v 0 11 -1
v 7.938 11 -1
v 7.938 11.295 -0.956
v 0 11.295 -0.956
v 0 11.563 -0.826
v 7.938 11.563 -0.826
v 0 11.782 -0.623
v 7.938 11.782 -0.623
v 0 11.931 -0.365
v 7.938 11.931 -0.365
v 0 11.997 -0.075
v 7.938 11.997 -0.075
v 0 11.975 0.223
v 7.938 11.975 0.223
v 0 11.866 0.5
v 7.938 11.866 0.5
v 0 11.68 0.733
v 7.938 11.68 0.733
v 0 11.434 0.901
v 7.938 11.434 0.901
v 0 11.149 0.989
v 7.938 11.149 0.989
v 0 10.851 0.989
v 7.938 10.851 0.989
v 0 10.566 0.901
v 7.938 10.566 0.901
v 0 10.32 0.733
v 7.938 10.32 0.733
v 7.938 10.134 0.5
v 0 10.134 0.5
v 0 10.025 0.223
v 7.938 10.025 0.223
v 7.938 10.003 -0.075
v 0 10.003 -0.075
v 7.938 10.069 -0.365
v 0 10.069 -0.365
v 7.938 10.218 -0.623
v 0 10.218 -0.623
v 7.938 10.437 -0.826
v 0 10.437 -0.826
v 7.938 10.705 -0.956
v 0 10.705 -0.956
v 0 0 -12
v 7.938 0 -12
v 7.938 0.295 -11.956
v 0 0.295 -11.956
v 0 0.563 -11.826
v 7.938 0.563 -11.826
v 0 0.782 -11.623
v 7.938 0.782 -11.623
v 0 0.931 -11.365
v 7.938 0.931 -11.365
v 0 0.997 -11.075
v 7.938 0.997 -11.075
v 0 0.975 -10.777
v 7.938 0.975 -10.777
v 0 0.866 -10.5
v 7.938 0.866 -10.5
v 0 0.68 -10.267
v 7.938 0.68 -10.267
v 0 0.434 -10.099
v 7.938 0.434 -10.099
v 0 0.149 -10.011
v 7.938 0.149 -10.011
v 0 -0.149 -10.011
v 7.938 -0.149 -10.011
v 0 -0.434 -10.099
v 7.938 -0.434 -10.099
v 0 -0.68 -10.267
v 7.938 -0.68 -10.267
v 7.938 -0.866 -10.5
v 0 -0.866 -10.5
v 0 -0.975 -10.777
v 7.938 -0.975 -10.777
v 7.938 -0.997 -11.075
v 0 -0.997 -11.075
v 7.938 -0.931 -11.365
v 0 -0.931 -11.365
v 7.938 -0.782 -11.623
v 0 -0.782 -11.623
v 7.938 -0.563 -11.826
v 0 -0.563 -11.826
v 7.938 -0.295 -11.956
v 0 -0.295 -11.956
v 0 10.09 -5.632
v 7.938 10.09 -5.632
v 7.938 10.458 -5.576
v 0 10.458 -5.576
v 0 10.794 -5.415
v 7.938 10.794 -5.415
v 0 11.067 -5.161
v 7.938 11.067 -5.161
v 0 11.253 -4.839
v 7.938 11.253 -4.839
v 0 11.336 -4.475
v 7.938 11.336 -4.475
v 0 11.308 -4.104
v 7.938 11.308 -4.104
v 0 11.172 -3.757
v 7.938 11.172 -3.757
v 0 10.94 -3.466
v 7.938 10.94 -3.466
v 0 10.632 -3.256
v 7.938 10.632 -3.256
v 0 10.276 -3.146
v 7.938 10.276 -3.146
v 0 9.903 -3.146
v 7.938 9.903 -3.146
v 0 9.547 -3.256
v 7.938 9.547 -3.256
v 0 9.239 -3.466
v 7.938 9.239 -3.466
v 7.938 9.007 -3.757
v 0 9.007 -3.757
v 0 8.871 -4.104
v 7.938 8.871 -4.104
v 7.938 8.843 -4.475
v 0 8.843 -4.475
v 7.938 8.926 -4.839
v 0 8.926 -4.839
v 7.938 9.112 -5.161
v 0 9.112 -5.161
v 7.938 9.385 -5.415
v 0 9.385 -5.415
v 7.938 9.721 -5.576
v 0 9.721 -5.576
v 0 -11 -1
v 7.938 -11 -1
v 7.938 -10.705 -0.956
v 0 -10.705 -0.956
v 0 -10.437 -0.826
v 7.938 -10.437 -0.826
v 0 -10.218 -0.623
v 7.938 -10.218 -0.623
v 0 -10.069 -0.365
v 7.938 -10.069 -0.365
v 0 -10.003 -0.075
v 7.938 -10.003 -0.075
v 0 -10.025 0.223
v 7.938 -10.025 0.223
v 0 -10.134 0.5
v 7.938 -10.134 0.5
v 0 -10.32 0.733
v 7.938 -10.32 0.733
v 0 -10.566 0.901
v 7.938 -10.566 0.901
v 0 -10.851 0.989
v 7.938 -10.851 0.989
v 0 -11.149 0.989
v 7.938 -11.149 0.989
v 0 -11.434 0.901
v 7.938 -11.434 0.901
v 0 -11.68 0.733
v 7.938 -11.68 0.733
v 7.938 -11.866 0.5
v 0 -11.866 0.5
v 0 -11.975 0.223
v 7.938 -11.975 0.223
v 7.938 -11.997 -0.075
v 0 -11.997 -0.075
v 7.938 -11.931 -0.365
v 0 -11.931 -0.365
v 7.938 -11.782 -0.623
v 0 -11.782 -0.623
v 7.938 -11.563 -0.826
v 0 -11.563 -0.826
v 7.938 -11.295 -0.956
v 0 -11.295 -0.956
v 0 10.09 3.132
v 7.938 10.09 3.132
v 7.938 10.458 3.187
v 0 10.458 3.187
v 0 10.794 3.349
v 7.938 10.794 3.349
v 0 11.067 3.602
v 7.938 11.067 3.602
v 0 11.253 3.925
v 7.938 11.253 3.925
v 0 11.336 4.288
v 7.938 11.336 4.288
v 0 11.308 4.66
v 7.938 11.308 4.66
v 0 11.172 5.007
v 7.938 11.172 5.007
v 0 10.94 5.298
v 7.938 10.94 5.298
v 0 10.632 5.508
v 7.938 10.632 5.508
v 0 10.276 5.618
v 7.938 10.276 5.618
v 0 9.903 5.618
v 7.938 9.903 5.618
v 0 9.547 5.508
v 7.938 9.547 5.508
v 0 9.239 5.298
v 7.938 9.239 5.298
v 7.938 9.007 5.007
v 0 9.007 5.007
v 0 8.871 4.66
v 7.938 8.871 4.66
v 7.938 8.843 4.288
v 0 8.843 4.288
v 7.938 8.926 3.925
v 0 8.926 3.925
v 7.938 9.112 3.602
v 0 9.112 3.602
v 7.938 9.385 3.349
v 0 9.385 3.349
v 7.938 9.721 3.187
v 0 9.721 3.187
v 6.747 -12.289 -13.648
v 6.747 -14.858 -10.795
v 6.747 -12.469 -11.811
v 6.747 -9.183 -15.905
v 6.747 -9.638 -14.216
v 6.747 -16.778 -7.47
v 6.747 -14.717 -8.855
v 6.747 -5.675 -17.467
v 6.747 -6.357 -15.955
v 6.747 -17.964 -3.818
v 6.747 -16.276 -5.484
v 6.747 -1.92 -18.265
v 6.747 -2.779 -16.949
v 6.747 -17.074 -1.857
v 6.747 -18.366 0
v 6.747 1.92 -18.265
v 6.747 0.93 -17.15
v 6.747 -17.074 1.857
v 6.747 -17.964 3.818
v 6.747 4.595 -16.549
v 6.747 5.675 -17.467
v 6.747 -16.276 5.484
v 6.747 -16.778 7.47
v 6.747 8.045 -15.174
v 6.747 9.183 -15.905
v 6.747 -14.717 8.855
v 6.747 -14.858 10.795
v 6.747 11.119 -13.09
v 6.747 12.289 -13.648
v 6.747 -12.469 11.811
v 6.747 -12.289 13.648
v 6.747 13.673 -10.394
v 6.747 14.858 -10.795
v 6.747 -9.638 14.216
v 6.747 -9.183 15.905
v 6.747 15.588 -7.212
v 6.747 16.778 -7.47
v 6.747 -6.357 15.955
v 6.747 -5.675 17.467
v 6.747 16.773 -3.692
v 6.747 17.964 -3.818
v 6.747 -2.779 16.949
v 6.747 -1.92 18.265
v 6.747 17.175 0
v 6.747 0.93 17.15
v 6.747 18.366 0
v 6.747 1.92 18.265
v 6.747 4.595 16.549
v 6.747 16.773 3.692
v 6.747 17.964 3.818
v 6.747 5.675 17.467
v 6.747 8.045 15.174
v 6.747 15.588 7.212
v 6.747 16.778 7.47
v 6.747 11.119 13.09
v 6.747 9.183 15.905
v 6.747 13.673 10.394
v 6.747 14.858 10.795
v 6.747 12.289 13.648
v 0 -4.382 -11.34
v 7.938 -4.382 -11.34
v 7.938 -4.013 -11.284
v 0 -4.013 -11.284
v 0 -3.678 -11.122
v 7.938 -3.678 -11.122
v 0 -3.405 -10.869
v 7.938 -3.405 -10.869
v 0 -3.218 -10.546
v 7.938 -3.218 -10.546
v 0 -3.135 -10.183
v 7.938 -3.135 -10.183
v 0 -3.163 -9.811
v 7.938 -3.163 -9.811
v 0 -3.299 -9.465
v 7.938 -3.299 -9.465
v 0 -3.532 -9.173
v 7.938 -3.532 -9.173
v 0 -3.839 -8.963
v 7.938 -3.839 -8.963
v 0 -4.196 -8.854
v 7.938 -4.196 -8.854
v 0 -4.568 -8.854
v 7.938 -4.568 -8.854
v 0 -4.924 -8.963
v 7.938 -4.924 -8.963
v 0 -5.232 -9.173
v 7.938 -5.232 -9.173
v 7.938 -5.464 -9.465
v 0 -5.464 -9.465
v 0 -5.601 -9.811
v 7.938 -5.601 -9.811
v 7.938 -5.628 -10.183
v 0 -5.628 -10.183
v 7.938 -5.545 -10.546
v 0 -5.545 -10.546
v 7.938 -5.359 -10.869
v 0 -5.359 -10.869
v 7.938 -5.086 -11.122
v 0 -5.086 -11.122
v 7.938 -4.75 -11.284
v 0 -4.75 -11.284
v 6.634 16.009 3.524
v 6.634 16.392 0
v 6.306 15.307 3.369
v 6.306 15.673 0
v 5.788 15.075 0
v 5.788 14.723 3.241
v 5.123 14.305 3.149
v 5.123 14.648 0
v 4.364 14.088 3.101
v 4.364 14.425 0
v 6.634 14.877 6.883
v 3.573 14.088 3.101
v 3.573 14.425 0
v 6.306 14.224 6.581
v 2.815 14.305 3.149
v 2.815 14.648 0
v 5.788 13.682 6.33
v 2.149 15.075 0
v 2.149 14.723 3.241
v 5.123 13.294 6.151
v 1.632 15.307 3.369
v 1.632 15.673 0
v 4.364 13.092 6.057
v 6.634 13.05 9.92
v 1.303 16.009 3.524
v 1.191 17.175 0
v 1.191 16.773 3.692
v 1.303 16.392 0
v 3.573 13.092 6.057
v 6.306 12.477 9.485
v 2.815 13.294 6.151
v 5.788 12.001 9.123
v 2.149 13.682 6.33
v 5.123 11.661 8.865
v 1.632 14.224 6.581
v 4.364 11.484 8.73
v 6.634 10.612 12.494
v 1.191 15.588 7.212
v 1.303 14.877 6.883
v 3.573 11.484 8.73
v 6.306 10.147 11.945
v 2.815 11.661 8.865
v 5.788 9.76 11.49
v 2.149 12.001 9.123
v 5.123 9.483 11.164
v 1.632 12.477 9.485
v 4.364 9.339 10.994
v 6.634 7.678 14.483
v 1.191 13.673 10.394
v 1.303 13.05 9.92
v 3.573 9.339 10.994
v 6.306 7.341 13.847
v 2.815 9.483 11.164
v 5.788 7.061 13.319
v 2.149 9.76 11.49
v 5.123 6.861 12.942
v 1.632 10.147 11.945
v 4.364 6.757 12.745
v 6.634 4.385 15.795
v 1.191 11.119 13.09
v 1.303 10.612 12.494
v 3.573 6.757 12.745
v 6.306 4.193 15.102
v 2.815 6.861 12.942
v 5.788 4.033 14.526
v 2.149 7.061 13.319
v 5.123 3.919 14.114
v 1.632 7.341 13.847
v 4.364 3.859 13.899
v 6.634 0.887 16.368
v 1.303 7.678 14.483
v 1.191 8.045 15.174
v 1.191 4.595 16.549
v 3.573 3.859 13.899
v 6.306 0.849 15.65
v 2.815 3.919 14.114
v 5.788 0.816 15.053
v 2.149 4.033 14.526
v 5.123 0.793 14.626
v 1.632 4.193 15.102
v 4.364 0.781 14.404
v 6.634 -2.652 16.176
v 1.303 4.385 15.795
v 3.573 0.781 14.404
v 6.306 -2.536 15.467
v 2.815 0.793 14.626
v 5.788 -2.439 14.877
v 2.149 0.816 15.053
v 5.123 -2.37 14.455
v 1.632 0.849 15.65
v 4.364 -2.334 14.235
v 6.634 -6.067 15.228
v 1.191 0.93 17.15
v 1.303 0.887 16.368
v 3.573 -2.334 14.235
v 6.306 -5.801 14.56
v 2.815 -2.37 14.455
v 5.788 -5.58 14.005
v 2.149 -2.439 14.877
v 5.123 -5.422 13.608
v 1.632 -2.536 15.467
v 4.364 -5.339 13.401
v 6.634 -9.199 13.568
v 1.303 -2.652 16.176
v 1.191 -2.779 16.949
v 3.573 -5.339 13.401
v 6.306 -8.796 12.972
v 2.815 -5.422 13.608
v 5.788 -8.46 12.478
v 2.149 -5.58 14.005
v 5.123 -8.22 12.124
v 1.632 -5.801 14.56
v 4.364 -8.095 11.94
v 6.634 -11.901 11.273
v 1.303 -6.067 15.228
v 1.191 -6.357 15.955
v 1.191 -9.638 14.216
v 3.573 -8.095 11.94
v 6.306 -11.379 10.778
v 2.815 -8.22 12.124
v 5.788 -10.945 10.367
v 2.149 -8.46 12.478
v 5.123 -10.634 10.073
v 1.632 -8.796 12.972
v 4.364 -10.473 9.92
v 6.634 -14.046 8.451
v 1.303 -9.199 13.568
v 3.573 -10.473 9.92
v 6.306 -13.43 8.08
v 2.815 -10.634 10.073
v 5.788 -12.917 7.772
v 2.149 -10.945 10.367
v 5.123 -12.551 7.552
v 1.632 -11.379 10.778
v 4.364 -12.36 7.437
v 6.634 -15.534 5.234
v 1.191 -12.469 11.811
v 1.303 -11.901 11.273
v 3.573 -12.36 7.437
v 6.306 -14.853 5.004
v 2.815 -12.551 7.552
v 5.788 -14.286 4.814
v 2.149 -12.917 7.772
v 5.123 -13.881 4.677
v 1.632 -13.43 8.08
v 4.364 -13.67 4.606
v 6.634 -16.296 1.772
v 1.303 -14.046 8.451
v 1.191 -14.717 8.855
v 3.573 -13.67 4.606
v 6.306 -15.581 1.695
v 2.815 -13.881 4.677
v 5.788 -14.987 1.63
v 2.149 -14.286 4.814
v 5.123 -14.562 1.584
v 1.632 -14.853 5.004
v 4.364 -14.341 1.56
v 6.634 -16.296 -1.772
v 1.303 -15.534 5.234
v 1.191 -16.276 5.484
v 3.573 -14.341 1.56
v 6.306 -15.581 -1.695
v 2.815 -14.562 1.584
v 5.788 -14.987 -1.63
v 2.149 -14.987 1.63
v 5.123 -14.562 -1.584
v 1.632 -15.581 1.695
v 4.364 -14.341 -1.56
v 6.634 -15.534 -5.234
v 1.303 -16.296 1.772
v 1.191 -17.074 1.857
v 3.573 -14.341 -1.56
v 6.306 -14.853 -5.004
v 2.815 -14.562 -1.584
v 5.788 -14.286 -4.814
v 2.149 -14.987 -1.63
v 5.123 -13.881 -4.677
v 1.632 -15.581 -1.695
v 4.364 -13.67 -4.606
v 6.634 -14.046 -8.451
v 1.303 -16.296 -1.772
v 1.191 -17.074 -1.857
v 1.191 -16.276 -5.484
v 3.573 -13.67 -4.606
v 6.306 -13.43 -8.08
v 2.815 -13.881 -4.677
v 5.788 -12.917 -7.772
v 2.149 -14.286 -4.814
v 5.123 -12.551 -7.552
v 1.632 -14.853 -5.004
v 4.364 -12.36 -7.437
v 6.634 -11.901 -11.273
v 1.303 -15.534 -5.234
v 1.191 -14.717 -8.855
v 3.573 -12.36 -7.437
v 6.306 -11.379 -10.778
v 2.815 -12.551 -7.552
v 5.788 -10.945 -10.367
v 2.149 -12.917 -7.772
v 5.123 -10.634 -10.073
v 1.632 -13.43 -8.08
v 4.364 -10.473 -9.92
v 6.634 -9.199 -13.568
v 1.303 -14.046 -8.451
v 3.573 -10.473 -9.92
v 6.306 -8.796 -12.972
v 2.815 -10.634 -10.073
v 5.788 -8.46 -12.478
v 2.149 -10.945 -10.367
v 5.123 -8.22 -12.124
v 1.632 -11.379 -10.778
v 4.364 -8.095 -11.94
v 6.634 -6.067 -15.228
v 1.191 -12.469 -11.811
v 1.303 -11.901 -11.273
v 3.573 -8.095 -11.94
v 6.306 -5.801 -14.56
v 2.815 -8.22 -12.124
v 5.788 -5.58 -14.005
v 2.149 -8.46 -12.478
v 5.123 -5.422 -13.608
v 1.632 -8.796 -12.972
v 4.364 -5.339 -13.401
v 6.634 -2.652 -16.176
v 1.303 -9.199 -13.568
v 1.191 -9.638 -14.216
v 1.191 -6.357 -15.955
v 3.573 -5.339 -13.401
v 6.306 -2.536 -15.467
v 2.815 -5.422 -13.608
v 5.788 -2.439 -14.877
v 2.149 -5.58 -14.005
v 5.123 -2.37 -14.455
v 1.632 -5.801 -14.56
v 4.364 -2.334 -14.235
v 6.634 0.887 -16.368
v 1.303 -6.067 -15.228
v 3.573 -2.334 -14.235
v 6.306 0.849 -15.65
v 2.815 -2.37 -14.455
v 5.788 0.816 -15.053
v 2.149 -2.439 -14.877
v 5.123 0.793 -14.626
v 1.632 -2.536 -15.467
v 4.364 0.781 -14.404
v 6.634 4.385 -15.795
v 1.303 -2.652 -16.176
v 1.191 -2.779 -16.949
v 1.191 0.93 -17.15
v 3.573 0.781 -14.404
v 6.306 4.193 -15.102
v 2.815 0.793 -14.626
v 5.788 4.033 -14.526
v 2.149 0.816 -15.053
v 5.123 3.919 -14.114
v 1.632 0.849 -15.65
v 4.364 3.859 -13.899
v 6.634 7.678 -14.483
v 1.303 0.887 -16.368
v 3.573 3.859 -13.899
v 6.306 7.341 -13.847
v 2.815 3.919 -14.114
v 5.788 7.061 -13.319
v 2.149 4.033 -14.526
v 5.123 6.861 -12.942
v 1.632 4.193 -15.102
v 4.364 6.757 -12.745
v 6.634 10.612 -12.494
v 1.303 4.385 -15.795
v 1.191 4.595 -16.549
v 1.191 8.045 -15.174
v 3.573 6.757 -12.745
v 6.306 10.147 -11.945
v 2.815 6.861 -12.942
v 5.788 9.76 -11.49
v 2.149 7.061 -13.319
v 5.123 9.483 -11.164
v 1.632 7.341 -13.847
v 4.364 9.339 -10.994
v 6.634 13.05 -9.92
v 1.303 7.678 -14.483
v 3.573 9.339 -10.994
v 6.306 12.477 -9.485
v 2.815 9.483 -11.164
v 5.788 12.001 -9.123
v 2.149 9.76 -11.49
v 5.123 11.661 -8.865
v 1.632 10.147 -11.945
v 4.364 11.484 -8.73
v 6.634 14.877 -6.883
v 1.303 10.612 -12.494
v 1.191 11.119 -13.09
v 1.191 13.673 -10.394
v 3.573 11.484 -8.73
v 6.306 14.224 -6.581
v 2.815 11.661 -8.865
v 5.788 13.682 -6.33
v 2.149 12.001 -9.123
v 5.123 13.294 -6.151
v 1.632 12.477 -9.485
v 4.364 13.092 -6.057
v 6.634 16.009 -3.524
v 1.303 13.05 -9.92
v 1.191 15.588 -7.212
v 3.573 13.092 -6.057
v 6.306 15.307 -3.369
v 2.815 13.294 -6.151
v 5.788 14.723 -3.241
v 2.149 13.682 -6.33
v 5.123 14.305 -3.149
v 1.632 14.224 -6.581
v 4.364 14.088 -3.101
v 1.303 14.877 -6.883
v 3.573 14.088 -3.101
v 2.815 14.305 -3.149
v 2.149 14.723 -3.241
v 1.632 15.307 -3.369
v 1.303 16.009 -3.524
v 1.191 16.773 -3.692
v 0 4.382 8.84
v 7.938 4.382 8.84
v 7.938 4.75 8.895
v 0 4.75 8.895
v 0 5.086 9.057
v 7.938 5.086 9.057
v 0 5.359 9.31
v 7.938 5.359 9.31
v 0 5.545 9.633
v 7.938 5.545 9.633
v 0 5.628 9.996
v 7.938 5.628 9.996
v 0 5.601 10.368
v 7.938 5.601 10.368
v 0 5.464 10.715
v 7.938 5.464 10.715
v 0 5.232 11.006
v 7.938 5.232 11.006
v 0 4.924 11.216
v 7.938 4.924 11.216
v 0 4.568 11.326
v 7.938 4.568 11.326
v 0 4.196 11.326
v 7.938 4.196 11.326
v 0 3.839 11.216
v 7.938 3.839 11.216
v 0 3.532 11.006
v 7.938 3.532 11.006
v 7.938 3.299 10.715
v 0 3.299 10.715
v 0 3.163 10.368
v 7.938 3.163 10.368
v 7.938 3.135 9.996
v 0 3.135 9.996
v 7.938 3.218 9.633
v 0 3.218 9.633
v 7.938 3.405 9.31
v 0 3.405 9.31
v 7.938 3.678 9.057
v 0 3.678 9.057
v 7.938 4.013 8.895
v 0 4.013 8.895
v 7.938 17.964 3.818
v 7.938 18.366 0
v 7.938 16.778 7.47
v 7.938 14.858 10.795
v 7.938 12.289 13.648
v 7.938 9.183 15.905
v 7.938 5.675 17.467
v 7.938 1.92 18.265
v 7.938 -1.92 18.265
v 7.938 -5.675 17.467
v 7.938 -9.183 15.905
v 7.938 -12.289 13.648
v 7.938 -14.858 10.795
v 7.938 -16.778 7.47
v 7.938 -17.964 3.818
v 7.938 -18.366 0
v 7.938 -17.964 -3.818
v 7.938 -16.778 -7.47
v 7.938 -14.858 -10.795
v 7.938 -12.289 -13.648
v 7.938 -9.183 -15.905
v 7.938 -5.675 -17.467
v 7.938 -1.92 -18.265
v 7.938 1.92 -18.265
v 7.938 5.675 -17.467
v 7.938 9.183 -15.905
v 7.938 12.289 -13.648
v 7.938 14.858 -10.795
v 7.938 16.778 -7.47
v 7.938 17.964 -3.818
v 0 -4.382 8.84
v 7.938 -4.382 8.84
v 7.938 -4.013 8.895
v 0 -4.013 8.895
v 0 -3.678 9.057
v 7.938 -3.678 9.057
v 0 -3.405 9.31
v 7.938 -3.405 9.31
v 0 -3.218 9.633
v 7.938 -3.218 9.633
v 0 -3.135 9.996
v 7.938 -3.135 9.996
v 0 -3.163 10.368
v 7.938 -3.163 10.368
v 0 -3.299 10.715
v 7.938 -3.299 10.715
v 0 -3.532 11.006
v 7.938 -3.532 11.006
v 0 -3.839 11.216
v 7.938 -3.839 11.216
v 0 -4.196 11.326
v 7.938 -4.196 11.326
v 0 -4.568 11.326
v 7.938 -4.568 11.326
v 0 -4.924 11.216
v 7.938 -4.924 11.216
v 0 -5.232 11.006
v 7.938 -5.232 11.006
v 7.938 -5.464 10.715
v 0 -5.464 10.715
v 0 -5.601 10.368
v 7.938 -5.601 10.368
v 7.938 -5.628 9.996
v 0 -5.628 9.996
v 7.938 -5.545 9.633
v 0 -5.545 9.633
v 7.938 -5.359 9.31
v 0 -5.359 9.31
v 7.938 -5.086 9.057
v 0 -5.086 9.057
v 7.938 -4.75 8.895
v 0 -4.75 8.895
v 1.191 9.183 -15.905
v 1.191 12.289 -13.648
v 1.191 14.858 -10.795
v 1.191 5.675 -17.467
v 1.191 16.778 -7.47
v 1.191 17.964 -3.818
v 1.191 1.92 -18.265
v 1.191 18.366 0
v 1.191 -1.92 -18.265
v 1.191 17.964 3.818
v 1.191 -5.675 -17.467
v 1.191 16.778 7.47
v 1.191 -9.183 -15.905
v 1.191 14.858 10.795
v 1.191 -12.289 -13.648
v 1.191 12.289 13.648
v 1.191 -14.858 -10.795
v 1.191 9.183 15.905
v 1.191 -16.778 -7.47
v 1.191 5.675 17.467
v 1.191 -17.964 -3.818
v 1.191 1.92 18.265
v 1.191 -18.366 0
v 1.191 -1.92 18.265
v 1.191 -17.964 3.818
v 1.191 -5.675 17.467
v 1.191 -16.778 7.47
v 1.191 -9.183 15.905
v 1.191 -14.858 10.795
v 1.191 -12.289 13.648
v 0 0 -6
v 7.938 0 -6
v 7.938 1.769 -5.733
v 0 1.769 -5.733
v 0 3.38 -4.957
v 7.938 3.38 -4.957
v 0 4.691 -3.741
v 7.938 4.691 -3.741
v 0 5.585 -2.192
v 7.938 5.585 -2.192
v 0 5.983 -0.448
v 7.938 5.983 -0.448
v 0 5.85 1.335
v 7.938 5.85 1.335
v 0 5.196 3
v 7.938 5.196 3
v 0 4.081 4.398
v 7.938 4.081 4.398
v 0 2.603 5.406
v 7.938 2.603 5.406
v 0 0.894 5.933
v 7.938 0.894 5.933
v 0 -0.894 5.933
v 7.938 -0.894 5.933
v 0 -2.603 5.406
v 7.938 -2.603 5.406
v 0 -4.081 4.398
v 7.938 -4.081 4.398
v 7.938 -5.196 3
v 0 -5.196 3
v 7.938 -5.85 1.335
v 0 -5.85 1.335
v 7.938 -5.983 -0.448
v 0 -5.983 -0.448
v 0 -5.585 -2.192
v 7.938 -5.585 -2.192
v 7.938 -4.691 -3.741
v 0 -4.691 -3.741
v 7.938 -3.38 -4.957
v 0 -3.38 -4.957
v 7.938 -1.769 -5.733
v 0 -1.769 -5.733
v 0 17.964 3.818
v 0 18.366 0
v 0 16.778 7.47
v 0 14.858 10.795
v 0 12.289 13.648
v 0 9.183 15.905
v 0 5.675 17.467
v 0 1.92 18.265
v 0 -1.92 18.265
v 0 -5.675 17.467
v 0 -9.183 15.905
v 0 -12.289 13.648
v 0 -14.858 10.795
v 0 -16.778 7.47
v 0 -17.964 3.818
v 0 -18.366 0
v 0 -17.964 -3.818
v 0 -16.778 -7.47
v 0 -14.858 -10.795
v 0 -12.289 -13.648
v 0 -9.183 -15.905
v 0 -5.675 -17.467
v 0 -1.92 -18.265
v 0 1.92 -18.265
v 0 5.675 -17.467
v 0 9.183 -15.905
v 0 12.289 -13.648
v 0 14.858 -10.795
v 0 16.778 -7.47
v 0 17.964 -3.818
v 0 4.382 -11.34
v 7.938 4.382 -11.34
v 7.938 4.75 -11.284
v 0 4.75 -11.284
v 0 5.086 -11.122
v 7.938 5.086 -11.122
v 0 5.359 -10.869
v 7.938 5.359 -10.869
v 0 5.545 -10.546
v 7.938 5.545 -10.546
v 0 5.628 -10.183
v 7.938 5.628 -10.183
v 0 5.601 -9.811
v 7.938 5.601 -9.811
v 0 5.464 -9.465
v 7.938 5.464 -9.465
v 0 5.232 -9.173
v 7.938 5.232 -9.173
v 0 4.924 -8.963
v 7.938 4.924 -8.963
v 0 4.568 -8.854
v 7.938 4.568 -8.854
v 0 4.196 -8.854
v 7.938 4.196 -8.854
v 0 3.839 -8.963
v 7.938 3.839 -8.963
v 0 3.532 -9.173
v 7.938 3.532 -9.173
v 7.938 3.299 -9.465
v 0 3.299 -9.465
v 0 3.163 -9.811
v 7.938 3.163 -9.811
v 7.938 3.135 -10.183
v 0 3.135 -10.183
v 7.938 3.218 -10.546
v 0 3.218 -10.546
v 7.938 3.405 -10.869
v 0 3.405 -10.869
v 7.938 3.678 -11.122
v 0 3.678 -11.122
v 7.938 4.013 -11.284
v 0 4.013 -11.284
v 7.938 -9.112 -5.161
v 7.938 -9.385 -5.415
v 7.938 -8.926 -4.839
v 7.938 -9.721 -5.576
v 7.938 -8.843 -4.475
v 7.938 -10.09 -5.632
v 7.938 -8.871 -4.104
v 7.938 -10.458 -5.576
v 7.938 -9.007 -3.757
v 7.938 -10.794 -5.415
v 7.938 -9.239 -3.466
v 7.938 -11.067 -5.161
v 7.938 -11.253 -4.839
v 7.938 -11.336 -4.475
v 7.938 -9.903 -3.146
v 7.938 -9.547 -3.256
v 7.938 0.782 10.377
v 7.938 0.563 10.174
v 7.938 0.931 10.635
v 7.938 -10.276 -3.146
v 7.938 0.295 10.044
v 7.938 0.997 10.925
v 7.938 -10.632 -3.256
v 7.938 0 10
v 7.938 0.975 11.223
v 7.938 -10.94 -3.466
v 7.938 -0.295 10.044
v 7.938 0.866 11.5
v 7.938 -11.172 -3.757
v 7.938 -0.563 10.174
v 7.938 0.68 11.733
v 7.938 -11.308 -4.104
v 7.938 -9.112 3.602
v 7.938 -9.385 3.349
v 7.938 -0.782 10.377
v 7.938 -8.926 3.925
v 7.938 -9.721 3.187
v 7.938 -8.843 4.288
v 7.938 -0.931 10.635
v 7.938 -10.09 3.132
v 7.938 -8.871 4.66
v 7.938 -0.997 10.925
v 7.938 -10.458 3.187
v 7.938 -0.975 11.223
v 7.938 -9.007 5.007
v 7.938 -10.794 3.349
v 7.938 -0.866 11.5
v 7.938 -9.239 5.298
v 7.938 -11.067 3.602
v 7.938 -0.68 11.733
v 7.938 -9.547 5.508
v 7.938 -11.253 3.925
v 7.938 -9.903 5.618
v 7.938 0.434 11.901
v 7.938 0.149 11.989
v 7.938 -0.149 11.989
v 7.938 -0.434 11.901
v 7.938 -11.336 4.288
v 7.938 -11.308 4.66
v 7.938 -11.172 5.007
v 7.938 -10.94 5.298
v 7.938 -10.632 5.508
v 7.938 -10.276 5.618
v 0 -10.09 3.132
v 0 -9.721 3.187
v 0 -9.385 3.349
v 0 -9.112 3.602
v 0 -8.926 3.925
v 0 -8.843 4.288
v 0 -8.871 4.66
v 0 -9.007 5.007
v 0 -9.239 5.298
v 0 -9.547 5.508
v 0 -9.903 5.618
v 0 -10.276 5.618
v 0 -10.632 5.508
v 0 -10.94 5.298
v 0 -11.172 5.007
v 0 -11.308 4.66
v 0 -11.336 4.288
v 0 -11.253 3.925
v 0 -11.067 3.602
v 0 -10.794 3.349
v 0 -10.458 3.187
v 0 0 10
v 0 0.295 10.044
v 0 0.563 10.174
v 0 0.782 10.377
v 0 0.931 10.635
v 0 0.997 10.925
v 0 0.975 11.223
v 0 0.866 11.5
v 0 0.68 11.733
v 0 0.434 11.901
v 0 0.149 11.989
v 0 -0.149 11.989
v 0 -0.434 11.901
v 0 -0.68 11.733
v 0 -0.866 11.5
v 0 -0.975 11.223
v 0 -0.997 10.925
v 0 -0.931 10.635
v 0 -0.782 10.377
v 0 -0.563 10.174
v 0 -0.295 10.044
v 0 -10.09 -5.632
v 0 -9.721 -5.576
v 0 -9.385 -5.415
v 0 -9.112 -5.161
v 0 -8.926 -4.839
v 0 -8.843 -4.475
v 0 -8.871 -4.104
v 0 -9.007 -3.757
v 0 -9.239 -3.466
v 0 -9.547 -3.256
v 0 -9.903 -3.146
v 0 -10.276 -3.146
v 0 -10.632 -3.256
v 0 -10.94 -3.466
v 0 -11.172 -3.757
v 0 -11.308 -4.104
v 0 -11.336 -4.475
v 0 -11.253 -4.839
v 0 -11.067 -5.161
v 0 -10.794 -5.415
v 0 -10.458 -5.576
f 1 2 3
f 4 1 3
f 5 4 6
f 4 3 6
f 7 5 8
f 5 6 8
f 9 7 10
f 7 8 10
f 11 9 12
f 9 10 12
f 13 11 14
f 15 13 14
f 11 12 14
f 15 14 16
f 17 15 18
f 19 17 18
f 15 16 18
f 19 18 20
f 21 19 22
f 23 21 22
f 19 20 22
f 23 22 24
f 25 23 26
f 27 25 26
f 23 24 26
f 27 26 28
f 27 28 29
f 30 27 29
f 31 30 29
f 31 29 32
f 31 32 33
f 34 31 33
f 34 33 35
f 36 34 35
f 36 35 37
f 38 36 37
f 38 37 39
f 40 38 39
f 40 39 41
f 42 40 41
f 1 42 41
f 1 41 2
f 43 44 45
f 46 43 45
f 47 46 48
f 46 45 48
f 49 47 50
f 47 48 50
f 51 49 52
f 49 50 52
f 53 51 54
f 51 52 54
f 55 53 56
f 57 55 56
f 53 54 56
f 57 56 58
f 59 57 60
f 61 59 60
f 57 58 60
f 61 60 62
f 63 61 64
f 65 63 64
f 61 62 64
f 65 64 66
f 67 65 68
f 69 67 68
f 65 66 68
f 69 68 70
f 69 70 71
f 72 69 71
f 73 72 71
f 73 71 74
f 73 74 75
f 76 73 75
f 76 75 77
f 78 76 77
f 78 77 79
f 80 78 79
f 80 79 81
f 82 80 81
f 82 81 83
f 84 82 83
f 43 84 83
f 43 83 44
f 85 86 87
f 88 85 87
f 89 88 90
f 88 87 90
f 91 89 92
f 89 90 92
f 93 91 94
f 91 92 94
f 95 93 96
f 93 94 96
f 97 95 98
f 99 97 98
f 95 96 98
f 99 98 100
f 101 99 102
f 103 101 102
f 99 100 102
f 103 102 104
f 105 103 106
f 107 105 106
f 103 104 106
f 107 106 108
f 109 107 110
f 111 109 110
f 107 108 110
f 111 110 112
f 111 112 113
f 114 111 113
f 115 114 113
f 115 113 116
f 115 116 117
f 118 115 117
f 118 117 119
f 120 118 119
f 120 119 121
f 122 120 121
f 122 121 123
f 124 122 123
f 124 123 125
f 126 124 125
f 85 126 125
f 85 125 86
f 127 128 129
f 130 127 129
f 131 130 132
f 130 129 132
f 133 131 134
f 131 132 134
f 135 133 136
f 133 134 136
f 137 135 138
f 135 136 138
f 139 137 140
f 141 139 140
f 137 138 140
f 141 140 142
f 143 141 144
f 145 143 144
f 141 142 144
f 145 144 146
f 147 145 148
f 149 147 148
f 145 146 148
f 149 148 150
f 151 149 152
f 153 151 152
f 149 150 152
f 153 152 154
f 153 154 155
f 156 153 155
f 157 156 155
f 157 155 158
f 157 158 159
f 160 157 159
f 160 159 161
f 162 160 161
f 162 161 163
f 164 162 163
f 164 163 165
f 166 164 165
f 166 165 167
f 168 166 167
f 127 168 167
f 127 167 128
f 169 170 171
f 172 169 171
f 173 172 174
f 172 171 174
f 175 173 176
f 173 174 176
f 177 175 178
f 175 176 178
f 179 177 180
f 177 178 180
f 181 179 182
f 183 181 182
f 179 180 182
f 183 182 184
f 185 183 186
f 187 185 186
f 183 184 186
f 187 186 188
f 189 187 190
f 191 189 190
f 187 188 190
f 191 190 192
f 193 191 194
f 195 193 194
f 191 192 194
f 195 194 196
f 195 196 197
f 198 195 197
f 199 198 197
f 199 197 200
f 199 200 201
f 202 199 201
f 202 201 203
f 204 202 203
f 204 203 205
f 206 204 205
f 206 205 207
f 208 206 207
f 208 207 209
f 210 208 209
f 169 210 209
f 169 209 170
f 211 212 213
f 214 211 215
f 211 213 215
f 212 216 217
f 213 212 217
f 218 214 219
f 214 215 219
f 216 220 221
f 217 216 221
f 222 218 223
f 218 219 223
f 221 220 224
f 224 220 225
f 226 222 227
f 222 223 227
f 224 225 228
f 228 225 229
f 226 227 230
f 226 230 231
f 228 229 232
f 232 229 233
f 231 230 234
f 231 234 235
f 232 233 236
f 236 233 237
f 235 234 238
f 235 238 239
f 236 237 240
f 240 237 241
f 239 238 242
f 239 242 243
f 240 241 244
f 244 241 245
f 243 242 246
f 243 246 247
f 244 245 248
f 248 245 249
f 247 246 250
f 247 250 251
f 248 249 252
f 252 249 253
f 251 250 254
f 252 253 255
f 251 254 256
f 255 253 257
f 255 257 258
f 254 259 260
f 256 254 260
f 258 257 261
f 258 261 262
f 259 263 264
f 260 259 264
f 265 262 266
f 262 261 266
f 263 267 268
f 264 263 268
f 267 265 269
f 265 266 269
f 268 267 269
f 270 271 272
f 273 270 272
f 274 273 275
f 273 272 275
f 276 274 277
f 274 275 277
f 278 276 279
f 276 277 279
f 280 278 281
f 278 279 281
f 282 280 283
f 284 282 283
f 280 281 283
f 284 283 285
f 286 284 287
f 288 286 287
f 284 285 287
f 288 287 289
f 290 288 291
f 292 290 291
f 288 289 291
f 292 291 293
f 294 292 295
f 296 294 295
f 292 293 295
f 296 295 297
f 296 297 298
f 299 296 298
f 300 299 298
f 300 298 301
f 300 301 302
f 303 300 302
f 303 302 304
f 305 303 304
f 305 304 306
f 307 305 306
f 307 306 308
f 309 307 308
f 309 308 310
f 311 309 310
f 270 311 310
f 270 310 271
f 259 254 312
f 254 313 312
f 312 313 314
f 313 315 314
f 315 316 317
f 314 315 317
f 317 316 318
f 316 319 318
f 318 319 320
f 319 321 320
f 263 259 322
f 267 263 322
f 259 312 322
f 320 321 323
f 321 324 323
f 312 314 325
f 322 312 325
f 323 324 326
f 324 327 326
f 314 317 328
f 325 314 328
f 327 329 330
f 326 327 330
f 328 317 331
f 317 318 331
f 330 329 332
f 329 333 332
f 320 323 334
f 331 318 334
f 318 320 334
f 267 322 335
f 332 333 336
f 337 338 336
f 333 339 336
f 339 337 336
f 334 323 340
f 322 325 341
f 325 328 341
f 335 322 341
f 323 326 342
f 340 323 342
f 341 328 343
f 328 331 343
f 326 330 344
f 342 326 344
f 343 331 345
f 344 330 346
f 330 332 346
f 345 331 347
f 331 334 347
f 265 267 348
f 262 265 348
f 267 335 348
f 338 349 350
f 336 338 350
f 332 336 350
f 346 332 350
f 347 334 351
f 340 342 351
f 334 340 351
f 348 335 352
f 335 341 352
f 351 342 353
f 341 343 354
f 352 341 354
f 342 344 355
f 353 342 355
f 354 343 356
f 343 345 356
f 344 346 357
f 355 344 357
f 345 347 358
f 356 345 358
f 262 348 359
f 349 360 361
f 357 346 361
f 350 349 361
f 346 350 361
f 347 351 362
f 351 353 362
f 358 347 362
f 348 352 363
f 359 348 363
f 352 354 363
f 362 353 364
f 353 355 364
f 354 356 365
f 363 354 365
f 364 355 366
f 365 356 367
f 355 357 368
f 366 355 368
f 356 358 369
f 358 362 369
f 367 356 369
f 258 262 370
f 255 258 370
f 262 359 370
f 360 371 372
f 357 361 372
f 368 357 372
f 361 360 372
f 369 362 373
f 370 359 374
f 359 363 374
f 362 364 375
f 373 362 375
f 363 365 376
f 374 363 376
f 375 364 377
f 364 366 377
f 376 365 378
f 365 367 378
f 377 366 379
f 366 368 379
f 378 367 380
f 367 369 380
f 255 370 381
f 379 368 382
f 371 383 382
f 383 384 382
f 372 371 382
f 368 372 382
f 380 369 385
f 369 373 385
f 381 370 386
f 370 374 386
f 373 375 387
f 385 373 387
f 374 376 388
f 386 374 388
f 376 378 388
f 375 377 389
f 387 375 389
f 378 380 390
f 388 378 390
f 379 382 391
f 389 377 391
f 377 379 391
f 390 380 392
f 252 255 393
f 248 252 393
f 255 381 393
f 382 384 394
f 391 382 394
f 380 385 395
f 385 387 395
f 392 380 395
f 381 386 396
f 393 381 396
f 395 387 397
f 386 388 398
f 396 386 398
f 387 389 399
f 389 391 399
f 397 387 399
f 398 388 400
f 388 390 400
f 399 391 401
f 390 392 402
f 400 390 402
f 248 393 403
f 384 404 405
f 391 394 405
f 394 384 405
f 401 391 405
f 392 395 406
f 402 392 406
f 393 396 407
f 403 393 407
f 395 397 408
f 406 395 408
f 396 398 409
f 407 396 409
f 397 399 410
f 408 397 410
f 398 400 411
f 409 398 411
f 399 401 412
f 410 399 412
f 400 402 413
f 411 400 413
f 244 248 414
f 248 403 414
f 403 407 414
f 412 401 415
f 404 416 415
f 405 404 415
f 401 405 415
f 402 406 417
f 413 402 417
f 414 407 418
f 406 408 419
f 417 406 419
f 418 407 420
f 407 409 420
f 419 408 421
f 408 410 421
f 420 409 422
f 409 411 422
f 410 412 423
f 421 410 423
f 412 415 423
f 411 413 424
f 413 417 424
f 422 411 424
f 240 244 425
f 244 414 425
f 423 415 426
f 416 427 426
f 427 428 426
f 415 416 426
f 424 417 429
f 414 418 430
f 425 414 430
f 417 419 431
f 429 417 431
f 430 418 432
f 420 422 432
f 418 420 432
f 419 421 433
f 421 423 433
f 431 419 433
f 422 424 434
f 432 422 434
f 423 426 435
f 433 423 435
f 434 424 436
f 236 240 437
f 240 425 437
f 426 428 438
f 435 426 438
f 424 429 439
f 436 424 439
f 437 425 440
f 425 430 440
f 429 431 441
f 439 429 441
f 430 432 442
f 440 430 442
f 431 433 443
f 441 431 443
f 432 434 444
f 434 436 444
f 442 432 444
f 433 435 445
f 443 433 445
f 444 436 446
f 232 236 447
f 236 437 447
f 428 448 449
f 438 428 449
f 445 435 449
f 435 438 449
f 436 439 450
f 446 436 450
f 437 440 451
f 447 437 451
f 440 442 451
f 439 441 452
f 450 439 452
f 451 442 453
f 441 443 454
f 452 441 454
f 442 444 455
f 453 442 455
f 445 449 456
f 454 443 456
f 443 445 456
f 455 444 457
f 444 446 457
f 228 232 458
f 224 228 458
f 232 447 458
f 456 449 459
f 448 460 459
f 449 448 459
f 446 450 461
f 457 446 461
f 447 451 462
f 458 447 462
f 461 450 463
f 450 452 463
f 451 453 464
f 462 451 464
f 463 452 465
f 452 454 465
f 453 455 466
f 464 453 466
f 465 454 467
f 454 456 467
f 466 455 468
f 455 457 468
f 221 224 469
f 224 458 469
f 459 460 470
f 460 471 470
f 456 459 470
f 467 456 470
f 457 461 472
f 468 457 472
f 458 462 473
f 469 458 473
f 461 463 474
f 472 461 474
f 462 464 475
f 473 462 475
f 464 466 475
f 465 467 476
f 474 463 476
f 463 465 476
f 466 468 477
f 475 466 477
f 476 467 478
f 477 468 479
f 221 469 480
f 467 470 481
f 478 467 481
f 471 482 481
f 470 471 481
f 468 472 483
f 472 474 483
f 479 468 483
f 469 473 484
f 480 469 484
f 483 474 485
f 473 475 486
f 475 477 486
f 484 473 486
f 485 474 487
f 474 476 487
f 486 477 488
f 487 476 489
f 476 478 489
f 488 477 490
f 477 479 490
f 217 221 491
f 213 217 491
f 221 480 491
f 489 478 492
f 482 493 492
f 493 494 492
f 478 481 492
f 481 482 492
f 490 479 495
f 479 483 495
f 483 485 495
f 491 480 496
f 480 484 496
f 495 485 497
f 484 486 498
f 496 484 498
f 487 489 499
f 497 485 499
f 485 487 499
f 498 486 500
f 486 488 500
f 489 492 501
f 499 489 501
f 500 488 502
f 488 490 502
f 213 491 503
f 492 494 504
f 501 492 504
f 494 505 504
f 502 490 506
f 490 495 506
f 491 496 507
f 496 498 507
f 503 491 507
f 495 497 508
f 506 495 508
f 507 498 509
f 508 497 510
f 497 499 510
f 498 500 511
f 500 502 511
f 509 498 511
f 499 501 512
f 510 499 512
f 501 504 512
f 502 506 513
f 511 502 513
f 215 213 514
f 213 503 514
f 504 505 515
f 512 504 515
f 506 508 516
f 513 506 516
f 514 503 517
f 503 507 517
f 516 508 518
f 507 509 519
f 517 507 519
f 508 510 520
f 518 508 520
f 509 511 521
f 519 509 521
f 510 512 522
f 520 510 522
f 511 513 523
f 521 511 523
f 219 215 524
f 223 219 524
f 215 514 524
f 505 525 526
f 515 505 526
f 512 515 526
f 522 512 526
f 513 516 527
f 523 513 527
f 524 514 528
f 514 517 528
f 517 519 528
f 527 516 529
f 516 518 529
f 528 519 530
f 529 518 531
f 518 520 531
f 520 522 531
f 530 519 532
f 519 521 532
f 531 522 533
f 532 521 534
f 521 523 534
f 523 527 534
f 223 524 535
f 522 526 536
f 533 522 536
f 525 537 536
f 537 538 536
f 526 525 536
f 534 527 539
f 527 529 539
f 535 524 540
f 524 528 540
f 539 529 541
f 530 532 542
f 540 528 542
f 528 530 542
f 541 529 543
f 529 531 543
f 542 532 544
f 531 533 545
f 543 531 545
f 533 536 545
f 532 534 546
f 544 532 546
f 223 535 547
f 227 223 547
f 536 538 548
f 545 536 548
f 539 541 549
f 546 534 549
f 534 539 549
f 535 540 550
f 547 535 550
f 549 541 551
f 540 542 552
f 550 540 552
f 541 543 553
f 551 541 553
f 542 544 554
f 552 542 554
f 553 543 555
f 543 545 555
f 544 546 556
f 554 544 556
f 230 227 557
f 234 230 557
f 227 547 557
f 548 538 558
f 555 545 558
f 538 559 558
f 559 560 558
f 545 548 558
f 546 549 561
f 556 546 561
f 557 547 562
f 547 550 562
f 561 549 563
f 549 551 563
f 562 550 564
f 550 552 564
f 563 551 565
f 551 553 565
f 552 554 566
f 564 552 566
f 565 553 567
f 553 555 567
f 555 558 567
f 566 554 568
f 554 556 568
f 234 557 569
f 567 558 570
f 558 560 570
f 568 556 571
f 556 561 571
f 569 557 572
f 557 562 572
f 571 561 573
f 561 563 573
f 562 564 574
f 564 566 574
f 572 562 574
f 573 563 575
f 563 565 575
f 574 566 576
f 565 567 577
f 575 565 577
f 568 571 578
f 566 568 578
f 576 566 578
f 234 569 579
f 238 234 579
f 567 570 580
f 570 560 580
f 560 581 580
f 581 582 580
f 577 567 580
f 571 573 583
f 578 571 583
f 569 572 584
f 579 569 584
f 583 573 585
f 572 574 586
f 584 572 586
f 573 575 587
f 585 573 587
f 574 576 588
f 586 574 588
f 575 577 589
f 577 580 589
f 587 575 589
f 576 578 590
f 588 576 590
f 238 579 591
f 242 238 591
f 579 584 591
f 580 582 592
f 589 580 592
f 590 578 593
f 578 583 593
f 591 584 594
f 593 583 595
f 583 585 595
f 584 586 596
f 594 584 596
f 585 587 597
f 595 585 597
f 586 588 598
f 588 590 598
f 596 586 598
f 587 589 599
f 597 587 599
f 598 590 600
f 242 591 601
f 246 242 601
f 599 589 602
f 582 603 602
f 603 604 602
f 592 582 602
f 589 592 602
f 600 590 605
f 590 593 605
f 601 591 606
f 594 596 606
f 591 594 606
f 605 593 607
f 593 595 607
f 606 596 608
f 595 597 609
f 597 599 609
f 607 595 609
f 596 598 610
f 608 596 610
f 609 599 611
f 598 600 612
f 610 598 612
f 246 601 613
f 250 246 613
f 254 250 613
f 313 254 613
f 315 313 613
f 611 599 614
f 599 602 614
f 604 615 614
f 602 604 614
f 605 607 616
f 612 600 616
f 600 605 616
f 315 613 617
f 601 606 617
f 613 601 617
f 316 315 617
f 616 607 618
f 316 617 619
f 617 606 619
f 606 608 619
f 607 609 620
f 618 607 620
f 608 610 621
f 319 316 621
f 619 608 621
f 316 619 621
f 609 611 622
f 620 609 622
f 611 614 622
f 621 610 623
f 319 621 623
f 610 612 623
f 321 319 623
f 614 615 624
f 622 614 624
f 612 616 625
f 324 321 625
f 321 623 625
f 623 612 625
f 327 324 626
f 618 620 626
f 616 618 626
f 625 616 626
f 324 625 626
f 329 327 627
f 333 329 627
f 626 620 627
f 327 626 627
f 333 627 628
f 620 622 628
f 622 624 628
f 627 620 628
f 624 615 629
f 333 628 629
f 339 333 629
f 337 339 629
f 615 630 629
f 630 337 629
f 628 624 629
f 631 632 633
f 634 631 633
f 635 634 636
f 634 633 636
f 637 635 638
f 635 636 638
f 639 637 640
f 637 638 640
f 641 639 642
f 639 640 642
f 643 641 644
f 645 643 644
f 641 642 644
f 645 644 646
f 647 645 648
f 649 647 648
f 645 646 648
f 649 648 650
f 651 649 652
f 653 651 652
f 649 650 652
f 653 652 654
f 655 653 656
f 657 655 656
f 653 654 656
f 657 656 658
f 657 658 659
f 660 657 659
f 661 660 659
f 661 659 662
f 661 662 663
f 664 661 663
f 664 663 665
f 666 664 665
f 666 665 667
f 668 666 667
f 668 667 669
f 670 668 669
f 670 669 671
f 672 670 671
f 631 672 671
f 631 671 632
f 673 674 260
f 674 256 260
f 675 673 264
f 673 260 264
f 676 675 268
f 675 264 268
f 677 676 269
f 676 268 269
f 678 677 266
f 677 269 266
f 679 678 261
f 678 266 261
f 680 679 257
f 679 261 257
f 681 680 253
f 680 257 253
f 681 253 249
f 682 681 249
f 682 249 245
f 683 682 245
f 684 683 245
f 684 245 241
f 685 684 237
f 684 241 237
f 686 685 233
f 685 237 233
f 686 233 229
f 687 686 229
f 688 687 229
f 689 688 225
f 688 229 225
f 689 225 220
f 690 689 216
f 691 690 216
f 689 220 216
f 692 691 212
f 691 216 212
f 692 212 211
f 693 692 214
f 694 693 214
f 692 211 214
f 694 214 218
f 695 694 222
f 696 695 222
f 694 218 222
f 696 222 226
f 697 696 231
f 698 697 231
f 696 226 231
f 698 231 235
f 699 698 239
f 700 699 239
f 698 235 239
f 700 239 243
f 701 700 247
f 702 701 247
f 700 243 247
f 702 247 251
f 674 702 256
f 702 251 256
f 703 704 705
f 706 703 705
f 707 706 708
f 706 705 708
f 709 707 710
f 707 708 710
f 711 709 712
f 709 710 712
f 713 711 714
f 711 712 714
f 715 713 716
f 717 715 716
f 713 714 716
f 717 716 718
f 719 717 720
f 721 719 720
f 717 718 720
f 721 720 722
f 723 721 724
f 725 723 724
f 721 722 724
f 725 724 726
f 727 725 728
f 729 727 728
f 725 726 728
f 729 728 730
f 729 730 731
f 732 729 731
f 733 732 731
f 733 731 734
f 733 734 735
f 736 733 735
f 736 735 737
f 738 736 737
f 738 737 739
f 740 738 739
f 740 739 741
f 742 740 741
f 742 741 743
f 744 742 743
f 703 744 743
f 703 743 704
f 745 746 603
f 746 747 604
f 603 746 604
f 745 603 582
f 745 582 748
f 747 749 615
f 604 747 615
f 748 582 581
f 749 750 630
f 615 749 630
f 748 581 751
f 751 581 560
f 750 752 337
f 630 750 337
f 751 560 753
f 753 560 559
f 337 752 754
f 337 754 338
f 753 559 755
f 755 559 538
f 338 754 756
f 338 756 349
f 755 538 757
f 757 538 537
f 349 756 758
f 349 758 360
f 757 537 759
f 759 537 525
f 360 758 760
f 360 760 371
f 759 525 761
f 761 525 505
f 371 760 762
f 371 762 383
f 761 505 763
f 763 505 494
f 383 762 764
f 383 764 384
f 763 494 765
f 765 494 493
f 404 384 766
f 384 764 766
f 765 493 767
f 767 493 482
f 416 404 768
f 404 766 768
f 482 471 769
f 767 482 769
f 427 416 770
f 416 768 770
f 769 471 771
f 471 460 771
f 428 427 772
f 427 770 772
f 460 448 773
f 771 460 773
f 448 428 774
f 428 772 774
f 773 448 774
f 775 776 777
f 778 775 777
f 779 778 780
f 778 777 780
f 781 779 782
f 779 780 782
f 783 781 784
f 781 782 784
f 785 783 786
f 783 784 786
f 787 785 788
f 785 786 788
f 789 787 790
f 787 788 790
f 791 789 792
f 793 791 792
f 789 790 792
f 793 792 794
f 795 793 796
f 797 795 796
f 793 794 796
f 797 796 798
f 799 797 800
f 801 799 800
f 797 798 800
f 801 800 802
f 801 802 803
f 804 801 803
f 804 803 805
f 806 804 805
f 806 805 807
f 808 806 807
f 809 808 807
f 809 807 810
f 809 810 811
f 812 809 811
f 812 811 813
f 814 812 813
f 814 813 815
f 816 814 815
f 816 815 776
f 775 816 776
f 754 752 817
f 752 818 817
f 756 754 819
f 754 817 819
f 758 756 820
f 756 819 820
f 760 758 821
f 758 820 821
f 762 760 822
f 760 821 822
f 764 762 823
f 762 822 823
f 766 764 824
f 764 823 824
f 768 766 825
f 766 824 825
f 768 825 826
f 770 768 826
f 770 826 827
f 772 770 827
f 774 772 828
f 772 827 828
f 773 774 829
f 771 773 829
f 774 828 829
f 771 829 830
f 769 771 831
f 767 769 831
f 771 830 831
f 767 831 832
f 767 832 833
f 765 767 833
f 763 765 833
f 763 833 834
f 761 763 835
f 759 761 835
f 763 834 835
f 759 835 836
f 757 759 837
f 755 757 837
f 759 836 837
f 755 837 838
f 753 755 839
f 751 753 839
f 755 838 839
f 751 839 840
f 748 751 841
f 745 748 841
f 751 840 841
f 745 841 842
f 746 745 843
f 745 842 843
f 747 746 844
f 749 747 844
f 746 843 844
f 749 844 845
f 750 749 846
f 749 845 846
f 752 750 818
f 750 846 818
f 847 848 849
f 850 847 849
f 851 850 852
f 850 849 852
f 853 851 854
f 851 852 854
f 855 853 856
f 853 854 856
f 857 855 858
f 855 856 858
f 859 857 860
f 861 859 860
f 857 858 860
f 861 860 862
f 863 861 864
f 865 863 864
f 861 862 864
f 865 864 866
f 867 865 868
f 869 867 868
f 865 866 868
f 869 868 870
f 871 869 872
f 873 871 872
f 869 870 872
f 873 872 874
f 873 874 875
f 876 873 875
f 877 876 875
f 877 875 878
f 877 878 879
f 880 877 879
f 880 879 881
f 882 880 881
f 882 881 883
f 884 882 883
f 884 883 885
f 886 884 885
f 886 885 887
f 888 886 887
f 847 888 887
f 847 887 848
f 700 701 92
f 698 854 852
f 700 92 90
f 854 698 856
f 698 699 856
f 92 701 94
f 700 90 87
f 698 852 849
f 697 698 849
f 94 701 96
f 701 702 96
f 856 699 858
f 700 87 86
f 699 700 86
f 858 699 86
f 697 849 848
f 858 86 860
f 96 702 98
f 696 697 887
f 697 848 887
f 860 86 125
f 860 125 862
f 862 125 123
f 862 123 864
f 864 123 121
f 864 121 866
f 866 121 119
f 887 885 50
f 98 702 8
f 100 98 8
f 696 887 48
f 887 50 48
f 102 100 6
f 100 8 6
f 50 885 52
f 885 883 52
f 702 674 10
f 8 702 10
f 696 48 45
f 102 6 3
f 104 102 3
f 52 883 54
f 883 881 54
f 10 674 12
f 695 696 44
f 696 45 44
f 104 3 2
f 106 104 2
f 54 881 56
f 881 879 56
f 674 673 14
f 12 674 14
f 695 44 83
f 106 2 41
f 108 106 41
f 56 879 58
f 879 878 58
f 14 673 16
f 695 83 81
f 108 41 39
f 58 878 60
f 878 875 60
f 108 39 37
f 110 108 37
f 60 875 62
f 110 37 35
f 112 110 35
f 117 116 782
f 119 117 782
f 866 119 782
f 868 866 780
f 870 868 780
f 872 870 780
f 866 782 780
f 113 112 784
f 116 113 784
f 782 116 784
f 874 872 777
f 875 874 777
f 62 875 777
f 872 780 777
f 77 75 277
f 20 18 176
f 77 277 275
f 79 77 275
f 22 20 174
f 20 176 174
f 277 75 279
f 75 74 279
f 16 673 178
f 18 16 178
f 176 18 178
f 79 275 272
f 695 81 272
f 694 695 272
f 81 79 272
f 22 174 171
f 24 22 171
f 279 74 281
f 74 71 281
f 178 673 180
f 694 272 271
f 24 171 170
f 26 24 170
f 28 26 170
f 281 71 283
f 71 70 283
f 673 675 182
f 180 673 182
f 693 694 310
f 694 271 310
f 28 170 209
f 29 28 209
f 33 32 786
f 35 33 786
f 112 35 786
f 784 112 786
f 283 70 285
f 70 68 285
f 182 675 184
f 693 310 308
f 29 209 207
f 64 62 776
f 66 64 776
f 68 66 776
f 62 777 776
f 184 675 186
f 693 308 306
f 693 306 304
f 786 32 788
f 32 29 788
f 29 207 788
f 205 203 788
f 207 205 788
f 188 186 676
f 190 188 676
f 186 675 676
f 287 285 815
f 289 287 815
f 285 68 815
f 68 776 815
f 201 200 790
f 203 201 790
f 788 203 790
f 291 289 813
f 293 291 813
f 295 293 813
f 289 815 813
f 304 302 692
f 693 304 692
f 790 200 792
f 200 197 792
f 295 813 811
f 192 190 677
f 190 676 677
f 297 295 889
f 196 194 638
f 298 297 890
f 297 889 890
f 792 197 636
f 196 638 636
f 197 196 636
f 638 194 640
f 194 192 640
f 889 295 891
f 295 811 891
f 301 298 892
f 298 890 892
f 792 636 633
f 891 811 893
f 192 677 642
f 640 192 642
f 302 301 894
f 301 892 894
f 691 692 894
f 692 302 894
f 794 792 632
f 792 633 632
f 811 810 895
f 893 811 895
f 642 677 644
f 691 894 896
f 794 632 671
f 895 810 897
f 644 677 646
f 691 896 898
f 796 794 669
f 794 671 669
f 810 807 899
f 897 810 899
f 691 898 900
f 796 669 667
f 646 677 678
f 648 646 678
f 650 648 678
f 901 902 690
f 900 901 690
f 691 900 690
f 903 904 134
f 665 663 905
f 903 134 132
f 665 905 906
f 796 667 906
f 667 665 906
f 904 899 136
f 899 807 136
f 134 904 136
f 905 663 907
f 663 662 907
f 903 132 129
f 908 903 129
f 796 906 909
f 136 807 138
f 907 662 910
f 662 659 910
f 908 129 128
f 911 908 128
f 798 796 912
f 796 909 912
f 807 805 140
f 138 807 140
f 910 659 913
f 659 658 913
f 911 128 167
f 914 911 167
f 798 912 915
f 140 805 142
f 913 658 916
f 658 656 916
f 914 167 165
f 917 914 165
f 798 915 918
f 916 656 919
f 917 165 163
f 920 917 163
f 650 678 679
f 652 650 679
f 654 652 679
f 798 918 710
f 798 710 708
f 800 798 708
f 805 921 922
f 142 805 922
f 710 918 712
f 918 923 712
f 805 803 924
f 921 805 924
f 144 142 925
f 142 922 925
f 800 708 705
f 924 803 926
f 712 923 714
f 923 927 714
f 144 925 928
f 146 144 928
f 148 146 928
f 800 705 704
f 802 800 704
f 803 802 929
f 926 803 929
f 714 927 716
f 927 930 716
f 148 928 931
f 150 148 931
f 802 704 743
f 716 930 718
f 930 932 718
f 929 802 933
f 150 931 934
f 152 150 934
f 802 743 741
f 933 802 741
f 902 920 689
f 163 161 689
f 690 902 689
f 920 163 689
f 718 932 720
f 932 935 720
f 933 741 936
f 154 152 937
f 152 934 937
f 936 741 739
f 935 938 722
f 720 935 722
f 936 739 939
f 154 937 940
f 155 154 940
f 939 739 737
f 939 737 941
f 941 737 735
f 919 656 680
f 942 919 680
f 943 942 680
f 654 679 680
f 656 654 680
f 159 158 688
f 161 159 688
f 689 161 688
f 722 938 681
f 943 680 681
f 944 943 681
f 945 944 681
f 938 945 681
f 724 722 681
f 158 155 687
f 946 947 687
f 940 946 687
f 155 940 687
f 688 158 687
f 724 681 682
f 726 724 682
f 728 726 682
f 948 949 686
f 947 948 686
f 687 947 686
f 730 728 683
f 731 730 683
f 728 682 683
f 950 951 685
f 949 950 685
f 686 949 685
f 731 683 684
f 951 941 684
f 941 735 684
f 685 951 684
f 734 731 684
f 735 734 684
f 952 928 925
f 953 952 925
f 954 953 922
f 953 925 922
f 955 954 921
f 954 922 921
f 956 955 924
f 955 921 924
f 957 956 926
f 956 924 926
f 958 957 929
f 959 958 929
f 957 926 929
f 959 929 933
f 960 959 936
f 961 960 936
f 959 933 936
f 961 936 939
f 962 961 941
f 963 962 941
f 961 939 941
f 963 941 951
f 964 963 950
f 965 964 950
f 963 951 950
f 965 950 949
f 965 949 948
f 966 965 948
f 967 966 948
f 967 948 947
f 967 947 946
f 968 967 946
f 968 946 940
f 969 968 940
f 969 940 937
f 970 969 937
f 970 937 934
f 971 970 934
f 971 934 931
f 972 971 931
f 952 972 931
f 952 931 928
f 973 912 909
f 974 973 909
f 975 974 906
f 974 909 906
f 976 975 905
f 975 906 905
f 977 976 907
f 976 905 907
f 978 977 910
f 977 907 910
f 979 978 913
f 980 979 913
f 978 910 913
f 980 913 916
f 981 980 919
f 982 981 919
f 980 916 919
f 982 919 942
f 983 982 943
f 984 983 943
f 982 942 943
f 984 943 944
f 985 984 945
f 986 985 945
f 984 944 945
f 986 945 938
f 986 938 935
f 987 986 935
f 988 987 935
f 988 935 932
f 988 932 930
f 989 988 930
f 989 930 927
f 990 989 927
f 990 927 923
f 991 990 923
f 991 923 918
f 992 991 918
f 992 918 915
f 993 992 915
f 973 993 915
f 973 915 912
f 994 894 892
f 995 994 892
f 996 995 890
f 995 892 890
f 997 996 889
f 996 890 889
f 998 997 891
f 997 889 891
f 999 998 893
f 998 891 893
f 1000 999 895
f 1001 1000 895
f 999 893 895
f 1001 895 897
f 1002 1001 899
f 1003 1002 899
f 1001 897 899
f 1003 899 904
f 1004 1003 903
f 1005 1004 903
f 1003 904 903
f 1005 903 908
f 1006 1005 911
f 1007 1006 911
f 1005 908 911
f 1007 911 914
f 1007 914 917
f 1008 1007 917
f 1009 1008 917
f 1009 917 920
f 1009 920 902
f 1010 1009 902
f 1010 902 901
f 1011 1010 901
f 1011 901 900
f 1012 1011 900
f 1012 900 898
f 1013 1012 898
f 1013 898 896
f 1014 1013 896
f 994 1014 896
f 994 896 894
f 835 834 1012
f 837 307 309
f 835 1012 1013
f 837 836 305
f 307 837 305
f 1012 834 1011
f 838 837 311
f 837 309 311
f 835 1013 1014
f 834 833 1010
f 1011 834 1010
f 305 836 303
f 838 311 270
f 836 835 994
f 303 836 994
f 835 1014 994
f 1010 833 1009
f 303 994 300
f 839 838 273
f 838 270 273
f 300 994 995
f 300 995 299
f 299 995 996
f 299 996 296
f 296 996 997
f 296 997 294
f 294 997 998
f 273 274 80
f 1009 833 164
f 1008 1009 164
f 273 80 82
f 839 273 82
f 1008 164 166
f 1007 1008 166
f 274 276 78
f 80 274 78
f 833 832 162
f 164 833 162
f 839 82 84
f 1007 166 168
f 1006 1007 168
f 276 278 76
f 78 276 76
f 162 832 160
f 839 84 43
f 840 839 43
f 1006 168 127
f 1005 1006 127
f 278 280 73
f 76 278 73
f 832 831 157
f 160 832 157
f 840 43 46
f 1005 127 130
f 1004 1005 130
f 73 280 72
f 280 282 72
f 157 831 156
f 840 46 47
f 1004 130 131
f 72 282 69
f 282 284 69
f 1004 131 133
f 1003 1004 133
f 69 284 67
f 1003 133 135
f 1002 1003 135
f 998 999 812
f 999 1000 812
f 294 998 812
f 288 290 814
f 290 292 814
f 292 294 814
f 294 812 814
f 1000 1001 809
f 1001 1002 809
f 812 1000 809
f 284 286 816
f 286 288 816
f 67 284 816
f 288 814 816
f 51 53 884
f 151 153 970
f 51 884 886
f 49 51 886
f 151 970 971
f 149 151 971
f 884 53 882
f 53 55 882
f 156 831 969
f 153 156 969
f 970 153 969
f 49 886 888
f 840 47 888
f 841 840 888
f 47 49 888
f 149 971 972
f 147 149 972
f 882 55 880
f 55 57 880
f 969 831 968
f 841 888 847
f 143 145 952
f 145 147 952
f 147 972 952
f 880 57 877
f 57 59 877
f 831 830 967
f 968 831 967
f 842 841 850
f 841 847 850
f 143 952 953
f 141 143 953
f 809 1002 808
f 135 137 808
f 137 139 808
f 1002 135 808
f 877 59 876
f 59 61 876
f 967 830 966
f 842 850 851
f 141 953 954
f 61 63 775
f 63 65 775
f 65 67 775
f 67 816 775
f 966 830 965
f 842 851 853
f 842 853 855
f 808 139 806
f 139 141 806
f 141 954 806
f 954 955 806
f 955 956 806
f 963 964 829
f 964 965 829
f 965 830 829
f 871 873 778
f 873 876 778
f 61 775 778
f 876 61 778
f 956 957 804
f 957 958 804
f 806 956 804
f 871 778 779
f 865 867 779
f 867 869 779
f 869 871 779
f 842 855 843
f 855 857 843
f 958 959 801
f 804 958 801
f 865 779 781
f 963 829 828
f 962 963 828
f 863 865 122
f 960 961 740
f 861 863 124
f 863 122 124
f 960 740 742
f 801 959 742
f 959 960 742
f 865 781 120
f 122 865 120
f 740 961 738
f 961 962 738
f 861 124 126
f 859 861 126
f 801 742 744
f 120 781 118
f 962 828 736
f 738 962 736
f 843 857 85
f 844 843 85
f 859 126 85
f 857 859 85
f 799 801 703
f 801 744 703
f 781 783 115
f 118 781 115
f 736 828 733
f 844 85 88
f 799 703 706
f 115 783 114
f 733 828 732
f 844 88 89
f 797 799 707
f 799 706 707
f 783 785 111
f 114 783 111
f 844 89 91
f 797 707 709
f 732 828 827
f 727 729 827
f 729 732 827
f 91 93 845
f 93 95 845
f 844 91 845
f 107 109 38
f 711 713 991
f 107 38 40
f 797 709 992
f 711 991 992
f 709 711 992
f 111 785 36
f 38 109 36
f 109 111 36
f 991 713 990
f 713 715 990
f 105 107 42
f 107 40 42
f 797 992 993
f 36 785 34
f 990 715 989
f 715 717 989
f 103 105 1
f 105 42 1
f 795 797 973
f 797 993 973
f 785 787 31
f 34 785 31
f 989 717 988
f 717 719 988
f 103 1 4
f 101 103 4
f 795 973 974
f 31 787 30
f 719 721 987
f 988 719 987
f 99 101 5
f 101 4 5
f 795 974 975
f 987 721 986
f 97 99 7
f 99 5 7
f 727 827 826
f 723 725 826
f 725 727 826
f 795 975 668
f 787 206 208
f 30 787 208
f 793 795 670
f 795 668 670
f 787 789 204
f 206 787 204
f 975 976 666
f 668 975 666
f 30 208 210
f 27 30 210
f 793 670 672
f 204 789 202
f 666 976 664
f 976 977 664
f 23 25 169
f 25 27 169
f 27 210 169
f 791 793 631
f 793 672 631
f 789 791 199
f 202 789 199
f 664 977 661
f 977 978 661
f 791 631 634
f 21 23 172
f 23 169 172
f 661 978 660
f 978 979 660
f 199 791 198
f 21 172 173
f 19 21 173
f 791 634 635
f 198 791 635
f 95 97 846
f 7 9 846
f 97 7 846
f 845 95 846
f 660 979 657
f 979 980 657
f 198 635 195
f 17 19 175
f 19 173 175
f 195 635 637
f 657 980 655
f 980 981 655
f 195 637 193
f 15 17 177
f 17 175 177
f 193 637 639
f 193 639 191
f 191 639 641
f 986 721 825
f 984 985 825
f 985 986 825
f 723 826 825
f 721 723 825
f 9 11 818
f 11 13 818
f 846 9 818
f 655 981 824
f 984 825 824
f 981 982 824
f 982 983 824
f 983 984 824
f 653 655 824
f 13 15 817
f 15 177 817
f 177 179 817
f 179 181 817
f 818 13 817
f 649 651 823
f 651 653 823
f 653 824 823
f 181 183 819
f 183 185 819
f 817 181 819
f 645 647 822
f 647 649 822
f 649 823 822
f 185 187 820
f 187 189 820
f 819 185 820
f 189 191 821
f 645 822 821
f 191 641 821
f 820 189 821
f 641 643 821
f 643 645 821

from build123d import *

# Parameters (mm, degrees)
SKETCH3_R      = 6
EXTRUDE1_DEPTH = 8.9375
SKETCH4_R      = 1
SKETCH4_R_2    = 1.25
EXTRUDE2_DEPTH = 8.9375


with BuildPart() as part:
    # Sketch1 → Revolve1 (revolve)
    with BuildSketch(Plane.XY):
        with BuildLine():
            Line((0, 0), (7.9375, 0))
            Line((7.9375, 0), (7.9375, 14))
            Line((7.9375, 14), (7.9375, 17.175))
            Line((7.9375, 17.175), (7.9375, 18.365625))
            Line((7.9375, 18.365625), (6.746875, 18.365625))
            Line((6.746875, 18.365625), (6.746875, 17.175))
            ThreePointArc((6.746875, 17.175), (3.96875, 14.396875), (1.190625, 17.175))
            Line((1.190625, 17.175), (1.190625, 18.365625))
            Line((1.190625, 18.365625), (0, 18.365625))
            Line((0, 18.365625), (0, 17.175))
            Line((0, 17.175), (0, 14))
            Line((0, 14), (0, 0))
        make_face()
    revolve(axis=Axis((0, 0, 0), (1, 0, 0)))

    # Sketch3 → Extrude1 (cut, through all)
    with BuildSketch(Plane(origin=(7.9375, 0, 0), x_dir=(0, 0, -1), z_dir=(1, 0, 0))):
        Circle(SKETCH3_R)
    extrude(amount=-EXTRUDE1_DEPTH, mode=Mode.SUBTRACT)

    # Sketch4 → Extrude2 (cut, through all)
    with BuildSketch(Plane(origin=(7.9375, 0, 0), x_dir=(0, 0, -1), z_dir=(1, 0, 0))):
        with Locations((0, 11)):
            Circle(SKETCH4_R)
        with Locations((-4.381841494, 10.089572098)):
            Circle(SKETCH4_R_2)
        with Locations((4.381841494, 10.089572098)):
            Circle(SKETCH4_R_2)
        with Locations((10.089572098, -4.381841494)):
            Circle(SKETCH4_R_2)
        with Locations((11, 0)):
            Circle(SKETCH4_R)
        with Locations((10.089572098, 4.381841494)):
            Circle(SKETCH4_R_2)
        with Locations((-4.381841494, -10.089572098)):
            Circle(SKETCH4_R_2)
        with Locations((0, -11)):
            Circle(SKETCH4_R)
        with Locations((4.381841494, -10.089572098)):
            Circle(SKETCH4_R_2)
        with Locations((-10.089572098, 4.381841494)):
            Circle(SKETCH4_R_2)
        with Locations((-11, 0)):
            Circle(SKETCH4_R)
        with Locations((-10.089572098, -4.381841494)):
            Circle(SKETCH4_R_2)
    extrude(amount=-EXTRUDE2_DEPTH, mode=Mode.SUBTRACT)


solid = part.part
